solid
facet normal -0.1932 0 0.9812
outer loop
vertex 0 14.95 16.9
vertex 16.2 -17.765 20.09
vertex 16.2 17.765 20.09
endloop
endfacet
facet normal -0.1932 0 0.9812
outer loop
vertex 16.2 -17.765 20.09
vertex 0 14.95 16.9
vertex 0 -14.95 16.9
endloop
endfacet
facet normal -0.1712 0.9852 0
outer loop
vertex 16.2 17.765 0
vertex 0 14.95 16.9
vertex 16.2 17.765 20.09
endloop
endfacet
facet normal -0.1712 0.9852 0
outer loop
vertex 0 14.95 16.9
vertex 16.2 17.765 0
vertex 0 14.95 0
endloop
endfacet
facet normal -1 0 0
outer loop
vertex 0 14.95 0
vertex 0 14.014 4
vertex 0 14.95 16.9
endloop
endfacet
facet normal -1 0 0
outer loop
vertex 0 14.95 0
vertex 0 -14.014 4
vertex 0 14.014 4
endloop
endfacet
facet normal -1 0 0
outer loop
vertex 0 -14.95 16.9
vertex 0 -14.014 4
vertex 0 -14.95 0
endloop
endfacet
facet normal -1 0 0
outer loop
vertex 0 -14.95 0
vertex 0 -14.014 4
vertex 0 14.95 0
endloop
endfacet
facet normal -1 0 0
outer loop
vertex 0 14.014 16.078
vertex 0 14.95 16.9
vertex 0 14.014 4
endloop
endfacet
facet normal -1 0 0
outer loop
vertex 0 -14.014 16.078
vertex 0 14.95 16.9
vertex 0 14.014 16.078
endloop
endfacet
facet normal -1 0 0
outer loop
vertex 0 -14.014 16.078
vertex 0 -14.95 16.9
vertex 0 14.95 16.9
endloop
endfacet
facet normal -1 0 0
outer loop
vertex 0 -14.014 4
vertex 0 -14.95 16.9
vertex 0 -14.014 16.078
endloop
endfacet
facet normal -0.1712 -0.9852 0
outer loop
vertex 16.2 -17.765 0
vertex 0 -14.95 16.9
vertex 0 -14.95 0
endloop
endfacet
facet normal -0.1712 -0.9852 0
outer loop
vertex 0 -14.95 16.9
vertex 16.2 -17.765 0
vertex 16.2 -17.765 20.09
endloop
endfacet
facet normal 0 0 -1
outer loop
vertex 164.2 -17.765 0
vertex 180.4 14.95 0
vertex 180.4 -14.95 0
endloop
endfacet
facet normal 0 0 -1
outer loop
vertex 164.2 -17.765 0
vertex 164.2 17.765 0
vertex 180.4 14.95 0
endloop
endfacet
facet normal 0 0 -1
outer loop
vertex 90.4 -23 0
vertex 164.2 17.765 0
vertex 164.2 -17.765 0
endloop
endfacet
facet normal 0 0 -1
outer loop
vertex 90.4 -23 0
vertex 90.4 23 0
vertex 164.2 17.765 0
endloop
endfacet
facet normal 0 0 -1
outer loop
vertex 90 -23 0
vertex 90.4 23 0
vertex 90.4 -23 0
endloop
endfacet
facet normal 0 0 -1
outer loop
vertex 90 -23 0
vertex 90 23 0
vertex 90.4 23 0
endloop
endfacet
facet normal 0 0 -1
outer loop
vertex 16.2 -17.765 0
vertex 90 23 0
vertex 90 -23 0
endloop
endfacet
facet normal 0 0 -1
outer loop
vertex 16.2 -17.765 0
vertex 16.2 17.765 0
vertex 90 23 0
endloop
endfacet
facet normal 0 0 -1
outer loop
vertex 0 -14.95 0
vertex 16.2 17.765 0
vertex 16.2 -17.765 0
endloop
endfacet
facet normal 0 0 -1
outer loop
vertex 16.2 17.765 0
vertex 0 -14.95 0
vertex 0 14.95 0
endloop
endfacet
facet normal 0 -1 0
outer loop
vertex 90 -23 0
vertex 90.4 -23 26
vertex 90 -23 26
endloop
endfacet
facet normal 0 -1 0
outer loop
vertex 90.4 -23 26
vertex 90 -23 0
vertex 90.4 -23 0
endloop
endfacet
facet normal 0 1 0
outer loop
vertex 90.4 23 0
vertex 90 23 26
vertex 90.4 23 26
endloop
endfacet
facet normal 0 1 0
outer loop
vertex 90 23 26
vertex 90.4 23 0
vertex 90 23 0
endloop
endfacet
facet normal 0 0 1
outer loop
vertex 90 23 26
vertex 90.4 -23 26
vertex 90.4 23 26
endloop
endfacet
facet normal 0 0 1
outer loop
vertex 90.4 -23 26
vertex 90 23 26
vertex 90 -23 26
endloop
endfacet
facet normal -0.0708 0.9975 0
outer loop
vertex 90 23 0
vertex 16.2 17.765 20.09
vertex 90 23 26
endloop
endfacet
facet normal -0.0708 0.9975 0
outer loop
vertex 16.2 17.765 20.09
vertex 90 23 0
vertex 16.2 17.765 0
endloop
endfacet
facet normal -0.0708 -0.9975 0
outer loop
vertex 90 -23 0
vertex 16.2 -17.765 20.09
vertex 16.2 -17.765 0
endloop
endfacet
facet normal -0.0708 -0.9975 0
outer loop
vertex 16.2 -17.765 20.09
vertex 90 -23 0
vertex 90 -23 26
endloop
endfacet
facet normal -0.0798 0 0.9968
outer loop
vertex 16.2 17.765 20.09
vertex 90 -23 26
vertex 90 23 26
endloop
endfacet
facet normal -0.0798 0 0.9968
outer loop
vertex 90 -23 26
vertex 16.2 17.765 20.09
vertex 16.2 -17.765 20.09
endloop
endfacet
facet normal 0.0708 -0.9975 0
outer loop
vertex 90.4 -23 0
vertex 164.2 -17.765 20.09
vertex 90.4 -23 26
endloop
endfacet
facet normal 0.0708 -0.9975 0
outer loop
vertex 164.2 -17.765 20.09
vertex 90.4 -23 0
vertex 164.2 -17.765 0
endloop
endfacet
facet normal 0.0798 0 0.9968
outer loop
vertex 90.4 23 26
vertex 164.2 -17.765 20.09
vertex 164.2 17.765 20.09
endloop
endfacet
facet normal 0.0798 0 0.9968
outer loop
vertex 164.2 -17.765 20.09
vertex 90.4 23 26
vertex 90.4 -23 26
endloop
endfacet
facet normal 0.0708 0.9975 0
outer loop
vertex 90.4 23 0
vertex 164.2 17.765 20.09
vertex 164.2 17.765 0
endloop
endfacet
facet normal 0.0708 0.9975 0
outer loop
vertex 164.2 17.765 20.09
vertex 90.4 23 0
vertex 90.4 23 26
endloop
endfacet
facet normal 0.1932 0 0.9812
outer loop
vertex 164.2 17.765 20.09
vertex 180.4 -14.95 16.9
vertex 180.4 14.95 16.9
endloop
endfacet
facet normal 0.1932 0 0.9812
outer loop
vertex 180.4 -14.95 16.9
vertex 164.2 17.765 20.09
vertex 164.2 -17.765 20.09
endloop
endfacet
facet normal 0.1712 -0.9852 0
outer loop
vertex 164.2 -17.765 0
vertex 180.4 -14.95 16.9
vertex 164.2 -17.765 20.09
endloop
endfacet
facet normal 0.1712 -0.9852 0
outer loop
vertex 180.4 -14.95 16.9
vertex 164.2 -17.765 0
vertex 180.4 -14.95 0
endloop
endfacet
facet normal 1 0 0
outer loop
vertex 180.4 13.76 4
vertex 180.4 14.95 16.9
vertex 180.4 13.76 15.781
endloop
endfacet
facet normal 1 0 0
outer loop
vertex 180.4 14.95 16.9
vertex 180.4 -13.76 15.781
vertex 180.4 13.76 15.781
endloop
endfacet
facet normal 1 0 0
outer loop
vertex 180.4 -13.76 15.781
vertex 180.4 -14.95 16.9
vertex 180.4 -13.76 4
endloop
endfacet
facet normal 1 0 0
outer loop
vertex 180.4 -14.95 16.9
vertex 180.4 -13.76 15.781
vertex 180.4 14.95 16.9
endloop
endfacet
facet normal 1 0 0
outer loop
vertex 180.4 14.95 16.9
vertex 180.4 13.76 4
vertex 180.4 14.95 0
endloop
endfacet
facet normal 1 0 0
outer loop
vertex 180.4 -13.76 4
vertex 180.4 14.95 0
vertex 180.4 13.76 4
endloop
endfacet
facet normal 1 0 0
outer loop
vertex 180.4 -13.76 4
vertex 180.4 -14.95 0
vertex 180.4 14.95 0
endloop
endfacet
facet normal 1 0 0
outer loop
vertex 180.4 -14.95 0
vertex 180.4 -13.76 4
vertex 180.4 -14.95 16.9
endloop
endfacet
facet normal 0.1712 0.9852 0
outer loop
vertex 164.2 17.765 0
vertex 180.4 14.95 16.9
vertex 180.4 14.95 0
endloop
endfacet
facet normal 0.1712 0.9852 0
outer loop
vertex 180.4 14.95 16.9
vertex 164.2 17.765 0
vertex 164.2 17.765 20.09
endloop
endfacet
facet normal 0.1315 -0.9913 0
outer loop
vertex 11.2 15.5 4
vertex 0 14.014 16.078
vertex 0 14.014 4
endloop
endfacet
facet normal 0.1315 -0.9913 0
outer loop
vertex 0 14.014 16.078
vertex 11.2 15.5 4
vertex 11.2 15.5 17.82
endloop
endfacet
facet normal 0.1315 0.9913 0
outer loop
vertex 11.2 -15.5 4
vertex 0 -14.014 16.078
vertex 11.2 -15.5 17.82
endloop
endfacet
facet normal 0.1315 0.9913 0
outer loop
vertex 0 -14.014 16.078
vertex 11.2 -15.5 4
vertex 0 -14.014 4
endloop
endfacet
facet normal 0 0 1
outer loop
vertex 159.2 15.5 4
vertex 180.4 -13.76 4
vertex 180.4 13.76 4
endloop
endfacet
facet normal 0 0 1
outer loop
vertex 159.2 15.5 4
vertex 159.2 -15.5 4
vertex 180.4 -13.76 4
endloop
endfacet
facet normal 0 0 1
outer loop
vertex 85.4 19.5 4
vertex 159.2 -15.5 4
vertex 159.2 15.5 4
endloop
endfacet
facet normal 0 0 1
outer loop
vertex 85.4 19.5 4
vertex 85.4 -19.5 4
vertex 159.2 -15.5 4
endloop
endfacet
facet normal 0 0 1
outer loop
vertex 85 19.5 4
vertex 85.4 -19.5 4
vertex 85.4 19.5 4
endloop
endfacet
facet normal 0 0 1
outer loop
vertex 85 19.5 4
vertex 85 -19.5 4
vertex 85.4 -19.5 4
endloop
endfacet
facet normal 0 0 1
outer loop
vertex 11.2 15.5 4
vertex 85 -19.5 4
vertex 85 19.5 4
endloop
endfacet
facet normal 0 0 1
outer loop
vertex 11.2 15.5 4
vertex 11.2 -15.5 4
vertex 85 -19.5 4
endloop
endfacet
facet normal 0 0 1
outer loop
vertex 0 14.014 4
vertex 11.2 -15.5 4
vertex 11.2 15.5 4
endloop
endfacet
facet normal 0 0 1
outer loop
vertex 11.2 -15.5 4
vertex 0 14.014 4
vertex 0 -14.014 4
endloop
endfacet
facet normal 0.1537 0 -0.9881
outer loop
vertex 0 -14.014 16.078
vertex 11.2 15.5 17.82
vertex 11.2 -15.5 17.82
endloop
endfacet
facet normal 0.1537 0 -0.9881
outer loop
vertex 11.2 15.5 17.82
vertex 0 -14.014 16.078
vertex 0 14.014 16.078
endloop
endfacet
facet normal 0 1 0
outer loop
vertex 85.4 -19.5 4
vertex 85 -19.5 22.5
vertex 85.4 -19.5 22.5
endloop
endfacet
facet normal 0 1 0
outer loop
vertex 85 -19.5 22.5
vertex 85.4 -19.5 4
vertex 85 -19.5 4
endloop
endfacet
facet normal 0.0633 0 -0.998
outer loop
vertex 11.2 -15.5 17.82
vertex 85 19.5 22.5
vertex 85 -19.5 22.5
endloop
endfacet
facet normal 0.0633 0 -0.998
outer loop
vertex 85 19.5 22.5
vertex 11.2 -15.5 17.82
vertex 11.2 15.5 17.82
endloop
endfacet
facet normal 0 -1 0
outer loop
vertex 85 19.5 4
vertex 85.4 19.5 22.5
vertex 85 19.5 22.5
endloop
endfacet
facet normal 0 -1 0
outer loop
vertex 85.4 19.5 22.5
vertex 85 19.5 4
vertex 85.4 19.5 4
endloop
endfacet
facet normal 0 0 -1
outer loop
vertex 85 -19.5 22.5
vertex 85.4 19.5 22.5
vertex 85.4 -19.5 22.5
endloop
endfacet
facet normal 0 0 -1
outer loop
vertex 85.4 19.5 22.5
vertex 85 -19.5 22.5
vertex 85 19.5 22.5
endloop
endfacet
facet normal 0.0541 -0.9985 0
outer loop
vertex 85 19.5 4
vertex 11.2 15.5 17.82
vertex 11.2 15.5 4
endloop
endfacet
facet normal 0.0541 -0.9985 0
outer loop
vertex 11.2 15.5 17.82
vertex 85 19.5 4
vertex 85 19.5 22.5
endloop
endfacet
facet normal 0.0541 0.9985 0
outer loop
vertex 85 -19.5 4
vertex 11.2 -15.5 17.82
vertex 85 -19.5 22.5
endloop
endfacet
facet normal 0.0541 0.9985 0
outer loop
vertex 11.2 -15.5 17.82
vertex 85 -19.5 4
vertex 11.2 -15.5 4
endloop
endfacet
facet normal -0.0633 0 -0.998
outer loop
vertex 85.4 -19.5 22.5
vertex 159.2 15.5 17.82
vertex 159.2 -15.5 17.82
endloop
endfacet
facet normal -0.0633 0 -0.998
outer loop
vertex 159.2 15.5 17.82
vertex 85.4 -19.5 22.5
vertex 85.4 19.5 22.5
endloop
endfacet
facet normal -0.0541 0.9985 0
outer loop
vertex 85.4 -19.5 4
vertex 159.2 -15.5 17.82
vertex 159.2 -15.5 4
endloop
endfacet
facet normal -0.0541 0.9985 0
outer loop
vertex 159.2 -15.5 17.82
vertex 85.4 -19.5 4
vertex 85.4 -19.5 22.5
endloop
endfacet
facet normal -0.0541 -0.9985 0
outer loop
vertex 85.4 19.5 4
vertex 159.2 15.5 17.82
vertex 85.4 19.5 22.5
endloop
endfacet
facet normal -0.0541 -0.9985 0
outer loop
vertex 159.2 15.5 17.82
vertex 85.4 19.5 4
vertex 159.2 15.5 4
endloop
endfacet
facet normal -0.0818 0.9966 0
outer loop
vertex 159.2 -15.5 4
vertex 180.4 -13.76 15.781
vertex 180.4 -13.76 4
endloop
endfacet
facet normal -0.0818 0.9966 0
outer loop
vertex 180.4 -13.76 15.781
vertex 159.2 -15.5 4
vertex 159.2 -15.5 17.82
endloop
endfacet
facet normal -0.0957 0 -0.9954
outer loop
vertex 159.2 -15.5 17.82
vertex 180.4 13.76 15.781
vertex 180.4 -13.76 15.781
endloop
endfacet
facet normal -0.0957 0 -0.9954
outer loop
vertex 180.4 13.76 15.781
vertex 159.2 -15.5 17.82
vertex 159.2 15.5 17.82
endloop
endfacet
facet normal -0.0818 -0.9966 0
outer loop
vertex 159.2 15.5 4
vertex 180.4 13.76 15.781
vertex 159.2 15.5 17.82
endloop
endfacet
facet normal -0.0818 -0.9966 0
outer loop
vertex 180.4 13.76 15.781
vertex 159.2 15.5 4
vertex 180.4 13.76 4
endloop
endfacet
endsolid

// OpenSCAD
$fn = 32;

// ----------------------------------------------------------------------
// Faired channel: 180 x 46 x 26 mm, 3.5 mm walls, faired ends
// ----------------------------------------------------------------------

// --- parameters (mm) ---
length = 180;             // channel length
width = 46;               // channel width at mid length
height = 26;              // channel height at mid length
wall = 3.5;               // side wall thickness
floor_t = 4;              // floor thickness
end_w = 29.9;             // faired end width
end_h = 16.9;             // faired end height

difference() {
  union() {
    hull() {
      translate([0, -14.95, 0]) cube([0.4, 29.9, 16.9]);
      translate([16.2, -17.765, 0]) cube([0.4, 35.53, 20.09]);
    }
    hull() {
      translate([16.2, -17.765, 0]) cube([0.4, 35.53, 20.09]);
      translate([90, -23, 0]) cube([0.4, 46, 26]);
    }
    hull() {
      translate([90, -23, 0]) cube([0.4, 46, 26]);
      translate([163.8, -17.765, 0]) cube([0.4, 35.53, 20.09]);
    }
    hull() {
      translate([163.8, -17.765, 0]) cube([0.4, 35.53, 20.09]);
      translate([180, -14.95, 0]) cube([0.4, 29.9, 16.9]);
    }
  }
  /* cavity, 5 mm proud of both ends so the ports are cut clean */
  hull() {
    translate([-5, -13.35, 4]) cube([0.4, 26.7, 11.3]);
    translate([11.2, -15.5, 4]) cube([0.4, 31, 13.82]);
  }
  hull() {
    translate([11.2, -15.5, 4]) cube([0.4, 31, 13.82]);
    translate([85, -19.5, 4]) cube([0.4, 39, 18.5]);
  }
  hull() {
    translate([85, -19.5, 4]) cube([0.4, 39, 18.5]);
    translate([158.8, -15.5, 4]) cube([0.4, 31, 13.82]);
  }
  hull() {
    translate([158.8, -15.5, 4]) cube([0.4, 31, 13.82]);
    translate([185, -13.35, 4]) cube([0.4, 26.7, 11.3]);
  }
}
